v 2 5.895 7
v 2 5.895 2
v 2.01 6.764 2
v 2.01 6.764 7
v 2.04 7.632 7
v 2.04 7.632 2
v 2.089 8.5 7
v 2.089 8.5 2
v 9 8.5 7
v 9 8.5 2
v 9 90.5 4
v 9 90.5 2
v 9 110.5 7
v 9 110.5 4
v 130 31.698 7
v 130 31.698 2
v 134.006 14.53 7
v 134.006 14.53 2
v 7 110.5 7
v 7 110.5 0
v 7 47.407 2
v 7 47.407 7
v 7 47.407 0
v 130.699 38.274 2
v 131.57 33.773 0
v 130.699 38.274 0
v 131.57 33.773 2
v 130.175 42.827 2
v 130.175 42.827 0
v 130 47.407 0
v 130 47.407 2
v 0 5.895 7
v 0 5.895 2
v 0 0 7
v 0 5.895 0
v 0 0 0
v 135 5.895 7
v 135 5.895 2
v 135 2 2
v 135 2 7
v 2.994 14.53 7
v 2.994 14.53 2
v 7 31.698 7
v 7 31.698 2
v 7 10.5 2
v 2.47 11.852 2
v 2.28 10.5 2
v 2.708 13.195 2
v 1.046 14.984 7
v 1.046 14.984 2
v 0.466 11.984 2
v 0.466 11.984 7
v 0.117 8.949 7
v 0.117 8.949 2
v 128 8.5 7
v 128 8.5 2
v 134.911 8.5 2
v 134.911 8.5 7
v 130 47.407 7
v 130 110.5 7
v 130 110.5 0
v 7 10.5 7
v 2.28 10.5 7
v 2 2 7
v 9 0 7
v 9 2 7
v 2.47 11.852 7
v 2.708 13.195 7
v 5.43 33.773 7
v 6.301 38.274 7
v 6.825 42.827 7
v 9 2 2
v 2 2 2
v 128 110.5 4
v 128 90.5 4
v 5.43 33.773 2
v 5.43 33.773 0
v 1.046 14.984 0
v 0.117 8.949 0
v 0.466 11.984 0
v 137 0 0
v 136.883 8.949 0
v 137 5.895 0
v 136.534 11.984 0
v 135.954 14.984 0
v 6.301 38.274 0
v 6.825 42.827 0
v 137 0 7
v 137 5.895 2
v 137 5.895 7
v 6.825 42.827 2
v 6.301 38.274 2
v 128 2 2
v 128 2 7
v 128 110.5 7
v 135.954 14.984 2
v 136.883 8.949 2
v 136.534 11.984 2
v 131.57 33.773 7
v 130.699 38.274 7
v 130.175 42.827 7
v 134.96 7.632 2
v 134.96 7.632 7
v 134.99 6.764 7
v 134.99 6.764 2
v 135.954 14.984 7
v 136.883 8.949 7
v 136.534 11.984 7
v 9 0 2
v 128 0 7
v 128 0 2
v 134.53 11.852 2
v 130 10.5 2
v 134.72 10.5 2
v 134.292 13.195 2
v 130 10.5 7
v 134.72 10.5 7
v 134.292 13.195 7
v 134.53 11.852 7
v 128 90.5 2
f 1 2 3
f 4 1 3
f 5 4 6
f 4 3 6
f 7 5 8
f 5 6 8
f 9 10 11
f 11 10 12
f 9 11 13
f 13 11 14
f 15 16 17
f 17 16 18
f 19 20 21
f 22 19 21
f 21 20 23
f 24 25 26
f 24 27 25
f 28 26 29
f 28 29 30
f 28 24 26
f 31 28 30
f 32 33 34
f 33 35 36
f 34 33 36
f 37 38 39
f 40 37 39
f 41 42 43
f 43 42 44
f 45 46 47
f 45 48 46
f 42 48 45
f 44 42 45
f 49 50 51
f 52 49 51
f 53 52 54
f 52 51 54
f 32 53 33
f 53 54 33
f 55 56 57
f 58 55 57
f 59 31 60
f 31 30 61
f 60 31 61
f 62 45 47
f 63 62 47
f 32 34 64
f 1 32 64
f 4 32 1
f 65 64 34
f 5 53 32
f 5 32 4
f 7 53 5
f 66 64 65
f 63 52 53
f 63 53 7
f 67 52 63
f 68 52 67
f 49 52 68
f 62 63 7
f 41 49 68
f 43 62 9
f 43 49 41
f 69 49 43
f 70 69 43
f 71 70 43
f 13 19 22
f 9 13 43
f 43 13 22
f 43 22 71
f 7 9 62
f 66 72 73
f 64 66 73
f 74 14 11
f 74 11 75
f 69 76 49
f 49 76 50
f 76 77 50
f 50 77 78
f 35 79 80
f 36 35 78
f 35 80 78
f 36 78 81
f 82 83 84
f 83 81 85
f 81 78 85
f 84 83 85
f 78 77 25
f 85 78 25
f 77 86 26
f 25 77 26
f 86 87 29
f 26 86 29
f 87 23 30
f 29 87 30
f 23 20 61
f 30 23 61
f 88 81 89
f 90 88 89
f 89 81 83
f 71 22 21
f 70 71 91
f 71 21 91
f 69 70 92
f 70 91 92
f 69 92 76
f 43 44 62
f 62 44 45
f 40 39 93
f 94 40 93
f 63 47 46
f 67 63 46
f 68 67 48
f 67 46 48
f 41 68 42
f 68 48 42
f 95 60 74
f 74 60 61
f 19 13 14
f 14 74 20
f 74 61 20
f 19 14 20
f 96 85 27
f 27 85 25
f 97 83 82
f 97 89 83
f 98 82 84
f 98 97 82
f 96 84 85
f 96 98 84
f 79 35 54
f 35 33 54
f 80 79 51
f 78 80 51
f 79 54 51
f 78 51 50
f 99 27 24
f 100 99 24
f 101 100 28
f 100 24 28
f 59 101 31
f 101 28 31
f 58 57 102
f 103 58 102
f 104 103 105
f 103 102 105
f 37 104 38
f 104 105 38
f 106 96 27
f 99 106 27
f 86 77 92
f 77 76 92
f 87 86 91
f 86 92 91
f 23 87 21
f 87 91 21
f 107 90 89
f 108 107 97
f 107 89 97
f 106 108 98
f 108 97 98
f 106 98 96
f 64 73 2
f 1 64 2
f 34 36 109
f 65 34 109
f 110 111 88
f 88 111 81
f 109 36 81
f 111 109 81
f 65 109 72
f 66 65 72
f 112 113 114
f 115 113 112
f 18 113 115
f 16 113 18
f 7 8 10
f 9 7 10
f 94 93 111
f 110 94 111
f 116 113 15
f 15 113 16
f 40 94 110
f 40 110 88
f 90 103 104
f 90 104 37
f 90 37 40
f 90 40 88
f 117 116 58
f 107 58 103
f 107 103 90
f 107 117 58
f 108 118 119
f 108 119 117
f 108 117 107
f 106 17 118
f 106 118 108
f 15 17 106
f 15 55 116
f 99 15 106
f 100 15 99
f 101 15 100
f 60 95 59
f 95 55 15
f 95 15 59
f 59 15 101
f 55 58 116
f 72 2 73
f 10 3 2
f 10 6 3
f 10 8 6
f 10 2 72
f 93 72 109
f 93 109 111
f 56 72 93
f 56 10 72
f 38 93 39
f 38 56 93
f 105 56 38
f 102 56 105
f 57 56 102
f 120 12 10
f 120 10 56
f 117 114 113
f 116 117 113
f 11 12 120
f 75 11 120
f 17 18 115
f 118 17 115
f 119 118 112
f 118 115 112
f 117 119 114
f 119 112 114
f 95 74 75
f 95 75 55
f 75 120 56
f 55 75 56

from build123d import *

# Parameters (mm, degrees)
F1_DEPTH = 2
F2_R     = 40
F3_R     = 60
F5_DEPTH = 5
F6_W     = 119
F6_H     = 20
F7_DEPTH = 2


with BuildPart() as f1:
    # F0 (on Top) → F1 (new body)
    with BuildSketch(Plane.XY):
        Polygon((0, 10.5), (0, 0), (68.5, 0), (137, 0), (137, 10.5), (130, 40.5), (130, 110.5), (68.5, 110.5), (7, 110.5), (7, 40.5), align=None)
    extrude(amount=F1_DEPTH)

    # F2
    f2_edges = [f1.edges().sort_by_distance(p)[0] for p in [
        (137, 10.5, 1),
        (0, 10.5, 1),
    ]]
    fillet(f2_edges, radius=F2_R)

    # F3
    f3_edges = [f1.edges().sort_by_distance(p)[0] for p in [
        (7, 40.5, 1),
        (130, 40.5, 1),
    ]]
    fillet(f3_edges, radius=F3_R)

    # F4 (on face) → F5 (join)
    with BuildSketch(Plane.XY.offset(2)):
        with BuildLine():
            Line((130, 110.5), (128, 110.5))
            Line((128, 110.5), (128, 47.40723087))
            Line((128, 47.40723087), (128, 8.5))
            Line((128, 8.5), (134.9106173749, 8.5))
            ThreePointArc((134.9106173749, 8.5), (134.9776477697, 7.1983562602), (135, 5.89517942))
            Line((135, 5.89517942), (135, 2))
            Line((135, 2), (128, 2))
            Line((128, 2), (128, 0))
            Line((128, 0), (137, 0))
            Line((137, 0), (137, 5.89517942))
            ThreePointArc((137, 5.89517942), (136.7375511046, 10.4697867481), (135.9536483897, 14.9843640443))
            Line((135.9536483897, 14.9843640443), (131.5695274155, 33.7734539336))
            ThreePointArc((131.5695274155, 33.7734539336), (130.393673343, 40.5453198778), (130, 47.40723087))
            Line((130, 47.40723087), (130, 110.5))
        make_face()
        with BuildLine():
            Line((134.7199632479, 10.5), (130, 10.5))
            Line((130, 10.5), (130, 31.6983303996))
            Line((130, 31.6983303996), (134.0059659702, 14.5299048131))
            ThreePointArc((134.0059659702, 14.5299048131), (134.4172574834, 12.5245717316), (134.7199632479, 10.5))
        make_face(mode=Mode.SUBTRACT)
        with BuildLine():
            Line((9, 8.5), (9, 47.40723087))
            Line((9, 47.40723087), (9, 110.5))
            Line((9, 110.5), (7, 110.5))
            Line((7, 110.5), (7, 47.40723087))
            ThreePointArc((7, 47.40723087), (6.606326657, 40.5453198778), (5.4304725845, 33.7734539336))
            Line((5.4304725845, 33.7734539336), (1.0463516103, 14.9843640443))
            ThreePointArc((1.0463516103, 14.9843640443), (0.2624488954, 10.4697867481), (0, 5.89517942))
            Line((0, 5.89517942), (0, 0))
            Line((0, 0), (9, 0))
            Line((9, 0), (9, 2))
            Line((9, 2), (2, 2))
            Line((2, 2), (2, 5.89517942))
            ThreePointArc((2, 5.89517942), (2.0223522303, 7.1983562602), (2.0893826251, 8.5))
            Line((2.0893826251, 8.5), (9, 8.5))
        make_face()
        with BuildLine():
            ThreePointArc((2.2800367521, 10.5), (2.5827425166, 12.5245717316), (2.9940340298, 14.5299048131))
            Line((2.9940340298, 14.5299048131), (7, 31.6983303996))
            Line((7, 31.6983303996), (7, 10.5))
            Line((7, 10.5), (2.2800367521, 10.5))
        make_face(mode=Mode.SUBTRACT)
    extrude(amount=F5_DEPTH)

    # F6 (on face) → F7 (join)
    with BuildSketch(Plane.XY.offset(2)):
        with Locations((68.5, 100.5)):
            Rectangle(F6_W, F6_H)
    extrude(amount=F7_DEPTH)


solid = f1.part
